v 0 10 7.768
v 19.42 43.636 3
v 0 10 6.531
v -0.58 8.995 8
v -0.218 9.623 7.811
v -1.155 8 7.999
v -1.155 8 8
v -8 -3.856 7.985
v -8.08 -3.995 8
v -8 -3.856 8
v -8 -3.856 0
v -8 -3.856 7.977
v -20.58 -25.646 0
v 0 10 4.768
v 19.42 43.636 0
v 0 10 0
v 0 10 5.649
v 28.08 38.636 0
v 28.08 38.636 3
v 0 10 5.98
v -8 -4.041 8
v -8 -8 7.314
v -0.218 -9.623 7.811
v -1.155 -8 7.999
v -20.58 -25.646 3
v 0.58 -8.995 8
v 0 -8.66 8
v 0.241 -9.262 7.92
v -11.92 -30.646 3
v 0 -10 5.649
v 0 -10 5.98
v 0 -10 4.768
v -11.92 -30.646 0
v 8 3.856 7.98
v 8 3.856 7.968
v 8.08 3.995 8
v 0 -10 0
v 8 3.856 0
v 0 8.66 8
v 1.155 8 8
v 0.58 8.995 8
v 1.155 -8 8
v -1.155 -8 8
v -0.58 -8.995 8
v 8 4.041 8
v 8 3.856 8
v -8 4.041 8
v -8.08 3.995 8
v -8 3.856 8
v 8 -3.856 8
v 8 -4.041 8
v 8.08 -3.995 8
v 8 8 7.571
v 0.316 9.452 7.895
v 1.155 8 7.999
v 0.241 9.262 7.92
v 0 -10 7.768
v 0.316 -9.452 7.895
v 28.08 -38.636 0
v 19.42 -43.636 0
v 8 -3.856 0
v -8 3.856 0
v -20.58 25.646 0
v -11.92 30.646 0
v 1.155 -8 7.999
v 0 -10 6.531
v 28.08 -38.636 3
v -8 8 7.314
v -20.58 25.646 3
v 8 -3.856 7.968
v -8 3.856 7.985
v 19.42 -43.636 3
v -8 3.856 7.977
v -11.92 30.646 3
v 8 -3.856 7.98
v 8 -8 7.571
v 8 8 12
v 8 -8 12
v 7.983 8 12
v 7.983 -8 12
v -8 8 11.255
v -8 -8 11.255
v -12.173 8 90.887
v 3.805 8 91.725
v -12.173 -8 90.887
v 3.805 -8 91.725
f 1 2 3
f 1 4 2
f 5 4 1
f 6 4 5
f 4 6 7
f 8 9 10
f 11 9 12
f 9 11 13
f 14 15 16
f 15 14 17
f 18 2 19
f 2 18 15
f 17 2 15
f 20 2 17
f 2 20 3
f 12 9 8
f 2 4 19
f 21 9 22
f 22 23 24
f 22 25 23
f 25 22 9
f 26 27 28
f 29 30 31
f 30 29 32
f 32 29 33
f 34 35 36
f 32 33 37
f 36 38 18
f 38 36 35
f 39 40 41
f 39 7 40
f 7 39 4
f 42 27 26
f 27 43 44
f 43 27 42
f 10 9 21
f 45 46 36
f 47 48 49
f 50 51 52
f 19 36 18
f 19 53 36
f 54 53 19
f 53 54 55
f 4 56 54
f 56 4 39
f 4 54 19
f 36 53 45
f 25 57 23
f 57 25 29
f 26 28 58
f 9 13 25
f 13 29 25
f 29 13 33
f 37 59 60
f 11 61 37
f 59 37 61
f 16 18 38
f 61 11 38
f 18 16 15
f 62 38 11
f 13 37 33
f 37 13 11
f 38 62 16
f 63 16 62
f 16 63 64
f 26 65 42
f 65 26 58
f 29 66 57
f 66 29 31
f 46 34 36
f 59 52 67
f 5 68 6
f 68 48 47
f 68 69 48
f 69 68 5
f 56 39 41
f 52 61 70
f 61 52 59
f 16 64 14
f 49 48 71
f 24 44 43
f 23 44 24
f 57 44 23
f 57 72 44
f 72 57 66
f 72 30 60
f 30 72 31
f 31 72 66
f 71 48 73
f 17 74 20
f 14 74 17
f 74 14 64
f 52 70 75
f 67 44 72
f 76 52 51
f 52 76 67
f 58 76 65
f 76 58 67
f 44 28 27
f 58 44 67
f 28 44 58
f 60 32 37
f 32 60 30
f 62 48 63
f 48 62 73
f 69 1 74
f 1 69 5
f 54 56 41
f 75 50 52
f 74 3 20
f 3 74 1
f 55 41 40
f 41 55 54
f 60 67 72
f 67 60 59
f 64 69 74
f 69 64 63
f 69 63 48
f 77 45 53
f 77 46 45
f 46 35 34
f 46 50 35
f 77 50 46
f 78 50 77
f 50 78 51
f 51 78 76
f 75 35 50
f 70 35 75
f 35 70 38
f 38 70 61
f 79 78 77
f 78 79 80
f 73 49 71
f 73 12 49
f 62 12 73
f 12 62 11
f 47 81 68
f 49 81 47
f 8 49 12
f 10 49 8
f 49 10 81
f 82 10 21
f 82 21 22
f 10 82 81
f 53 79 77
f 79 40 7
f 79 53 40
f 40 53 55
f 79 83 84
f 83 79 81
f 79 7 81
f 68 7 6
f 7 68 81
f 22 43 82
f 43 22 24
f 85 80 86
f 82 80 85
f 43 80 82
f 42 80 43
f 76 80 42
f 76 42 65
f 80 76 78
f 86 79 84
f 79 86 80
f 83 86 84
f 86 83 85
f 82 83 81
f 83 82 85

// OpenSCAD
$fn=100;

module one_leg() {
  translate([-32.5, 5, 0]) rotate([90, 0, 0])
    linear_extrude(10) {
      polygon(points=[[0, 0], [80, 0], [80, 3], [40, 8], [25, 8], [0, 3]]);
    }
}

module basement() {
  rotate([0, 0, 60]) one_leg();
  rotate([0, 0, -60]) one_leg();
  translate([-8, -8, 0]) cube([16, 16, 12]);
}

module spine() {
  translate([2, 2, 0]) cube([12, 12, 8]);
  translate([0, 0, 8]) cube([16, 16, 80]);
}


/*
translate([0, 0, 0]) cylinder(h=3, d=8);
translate([50, 30, 0]) cylinder(h=3, d=8);
translate([50, 0, 0]) cylinder(h=3, d=8);
translate([0, 30, 0]) cylinder(h=3, d=8);
translate([0, 0, 0]) cube([50, 30, 3]);
*/

/*
difference() {
  basement();
  rotate([0, -3, 0]) translate([-7.4, -8, 3.4]) spine();
}
*/

  basement();
  rotate([0, -3, 0]) translate([-7.4, -8, 3.4]) spine();
